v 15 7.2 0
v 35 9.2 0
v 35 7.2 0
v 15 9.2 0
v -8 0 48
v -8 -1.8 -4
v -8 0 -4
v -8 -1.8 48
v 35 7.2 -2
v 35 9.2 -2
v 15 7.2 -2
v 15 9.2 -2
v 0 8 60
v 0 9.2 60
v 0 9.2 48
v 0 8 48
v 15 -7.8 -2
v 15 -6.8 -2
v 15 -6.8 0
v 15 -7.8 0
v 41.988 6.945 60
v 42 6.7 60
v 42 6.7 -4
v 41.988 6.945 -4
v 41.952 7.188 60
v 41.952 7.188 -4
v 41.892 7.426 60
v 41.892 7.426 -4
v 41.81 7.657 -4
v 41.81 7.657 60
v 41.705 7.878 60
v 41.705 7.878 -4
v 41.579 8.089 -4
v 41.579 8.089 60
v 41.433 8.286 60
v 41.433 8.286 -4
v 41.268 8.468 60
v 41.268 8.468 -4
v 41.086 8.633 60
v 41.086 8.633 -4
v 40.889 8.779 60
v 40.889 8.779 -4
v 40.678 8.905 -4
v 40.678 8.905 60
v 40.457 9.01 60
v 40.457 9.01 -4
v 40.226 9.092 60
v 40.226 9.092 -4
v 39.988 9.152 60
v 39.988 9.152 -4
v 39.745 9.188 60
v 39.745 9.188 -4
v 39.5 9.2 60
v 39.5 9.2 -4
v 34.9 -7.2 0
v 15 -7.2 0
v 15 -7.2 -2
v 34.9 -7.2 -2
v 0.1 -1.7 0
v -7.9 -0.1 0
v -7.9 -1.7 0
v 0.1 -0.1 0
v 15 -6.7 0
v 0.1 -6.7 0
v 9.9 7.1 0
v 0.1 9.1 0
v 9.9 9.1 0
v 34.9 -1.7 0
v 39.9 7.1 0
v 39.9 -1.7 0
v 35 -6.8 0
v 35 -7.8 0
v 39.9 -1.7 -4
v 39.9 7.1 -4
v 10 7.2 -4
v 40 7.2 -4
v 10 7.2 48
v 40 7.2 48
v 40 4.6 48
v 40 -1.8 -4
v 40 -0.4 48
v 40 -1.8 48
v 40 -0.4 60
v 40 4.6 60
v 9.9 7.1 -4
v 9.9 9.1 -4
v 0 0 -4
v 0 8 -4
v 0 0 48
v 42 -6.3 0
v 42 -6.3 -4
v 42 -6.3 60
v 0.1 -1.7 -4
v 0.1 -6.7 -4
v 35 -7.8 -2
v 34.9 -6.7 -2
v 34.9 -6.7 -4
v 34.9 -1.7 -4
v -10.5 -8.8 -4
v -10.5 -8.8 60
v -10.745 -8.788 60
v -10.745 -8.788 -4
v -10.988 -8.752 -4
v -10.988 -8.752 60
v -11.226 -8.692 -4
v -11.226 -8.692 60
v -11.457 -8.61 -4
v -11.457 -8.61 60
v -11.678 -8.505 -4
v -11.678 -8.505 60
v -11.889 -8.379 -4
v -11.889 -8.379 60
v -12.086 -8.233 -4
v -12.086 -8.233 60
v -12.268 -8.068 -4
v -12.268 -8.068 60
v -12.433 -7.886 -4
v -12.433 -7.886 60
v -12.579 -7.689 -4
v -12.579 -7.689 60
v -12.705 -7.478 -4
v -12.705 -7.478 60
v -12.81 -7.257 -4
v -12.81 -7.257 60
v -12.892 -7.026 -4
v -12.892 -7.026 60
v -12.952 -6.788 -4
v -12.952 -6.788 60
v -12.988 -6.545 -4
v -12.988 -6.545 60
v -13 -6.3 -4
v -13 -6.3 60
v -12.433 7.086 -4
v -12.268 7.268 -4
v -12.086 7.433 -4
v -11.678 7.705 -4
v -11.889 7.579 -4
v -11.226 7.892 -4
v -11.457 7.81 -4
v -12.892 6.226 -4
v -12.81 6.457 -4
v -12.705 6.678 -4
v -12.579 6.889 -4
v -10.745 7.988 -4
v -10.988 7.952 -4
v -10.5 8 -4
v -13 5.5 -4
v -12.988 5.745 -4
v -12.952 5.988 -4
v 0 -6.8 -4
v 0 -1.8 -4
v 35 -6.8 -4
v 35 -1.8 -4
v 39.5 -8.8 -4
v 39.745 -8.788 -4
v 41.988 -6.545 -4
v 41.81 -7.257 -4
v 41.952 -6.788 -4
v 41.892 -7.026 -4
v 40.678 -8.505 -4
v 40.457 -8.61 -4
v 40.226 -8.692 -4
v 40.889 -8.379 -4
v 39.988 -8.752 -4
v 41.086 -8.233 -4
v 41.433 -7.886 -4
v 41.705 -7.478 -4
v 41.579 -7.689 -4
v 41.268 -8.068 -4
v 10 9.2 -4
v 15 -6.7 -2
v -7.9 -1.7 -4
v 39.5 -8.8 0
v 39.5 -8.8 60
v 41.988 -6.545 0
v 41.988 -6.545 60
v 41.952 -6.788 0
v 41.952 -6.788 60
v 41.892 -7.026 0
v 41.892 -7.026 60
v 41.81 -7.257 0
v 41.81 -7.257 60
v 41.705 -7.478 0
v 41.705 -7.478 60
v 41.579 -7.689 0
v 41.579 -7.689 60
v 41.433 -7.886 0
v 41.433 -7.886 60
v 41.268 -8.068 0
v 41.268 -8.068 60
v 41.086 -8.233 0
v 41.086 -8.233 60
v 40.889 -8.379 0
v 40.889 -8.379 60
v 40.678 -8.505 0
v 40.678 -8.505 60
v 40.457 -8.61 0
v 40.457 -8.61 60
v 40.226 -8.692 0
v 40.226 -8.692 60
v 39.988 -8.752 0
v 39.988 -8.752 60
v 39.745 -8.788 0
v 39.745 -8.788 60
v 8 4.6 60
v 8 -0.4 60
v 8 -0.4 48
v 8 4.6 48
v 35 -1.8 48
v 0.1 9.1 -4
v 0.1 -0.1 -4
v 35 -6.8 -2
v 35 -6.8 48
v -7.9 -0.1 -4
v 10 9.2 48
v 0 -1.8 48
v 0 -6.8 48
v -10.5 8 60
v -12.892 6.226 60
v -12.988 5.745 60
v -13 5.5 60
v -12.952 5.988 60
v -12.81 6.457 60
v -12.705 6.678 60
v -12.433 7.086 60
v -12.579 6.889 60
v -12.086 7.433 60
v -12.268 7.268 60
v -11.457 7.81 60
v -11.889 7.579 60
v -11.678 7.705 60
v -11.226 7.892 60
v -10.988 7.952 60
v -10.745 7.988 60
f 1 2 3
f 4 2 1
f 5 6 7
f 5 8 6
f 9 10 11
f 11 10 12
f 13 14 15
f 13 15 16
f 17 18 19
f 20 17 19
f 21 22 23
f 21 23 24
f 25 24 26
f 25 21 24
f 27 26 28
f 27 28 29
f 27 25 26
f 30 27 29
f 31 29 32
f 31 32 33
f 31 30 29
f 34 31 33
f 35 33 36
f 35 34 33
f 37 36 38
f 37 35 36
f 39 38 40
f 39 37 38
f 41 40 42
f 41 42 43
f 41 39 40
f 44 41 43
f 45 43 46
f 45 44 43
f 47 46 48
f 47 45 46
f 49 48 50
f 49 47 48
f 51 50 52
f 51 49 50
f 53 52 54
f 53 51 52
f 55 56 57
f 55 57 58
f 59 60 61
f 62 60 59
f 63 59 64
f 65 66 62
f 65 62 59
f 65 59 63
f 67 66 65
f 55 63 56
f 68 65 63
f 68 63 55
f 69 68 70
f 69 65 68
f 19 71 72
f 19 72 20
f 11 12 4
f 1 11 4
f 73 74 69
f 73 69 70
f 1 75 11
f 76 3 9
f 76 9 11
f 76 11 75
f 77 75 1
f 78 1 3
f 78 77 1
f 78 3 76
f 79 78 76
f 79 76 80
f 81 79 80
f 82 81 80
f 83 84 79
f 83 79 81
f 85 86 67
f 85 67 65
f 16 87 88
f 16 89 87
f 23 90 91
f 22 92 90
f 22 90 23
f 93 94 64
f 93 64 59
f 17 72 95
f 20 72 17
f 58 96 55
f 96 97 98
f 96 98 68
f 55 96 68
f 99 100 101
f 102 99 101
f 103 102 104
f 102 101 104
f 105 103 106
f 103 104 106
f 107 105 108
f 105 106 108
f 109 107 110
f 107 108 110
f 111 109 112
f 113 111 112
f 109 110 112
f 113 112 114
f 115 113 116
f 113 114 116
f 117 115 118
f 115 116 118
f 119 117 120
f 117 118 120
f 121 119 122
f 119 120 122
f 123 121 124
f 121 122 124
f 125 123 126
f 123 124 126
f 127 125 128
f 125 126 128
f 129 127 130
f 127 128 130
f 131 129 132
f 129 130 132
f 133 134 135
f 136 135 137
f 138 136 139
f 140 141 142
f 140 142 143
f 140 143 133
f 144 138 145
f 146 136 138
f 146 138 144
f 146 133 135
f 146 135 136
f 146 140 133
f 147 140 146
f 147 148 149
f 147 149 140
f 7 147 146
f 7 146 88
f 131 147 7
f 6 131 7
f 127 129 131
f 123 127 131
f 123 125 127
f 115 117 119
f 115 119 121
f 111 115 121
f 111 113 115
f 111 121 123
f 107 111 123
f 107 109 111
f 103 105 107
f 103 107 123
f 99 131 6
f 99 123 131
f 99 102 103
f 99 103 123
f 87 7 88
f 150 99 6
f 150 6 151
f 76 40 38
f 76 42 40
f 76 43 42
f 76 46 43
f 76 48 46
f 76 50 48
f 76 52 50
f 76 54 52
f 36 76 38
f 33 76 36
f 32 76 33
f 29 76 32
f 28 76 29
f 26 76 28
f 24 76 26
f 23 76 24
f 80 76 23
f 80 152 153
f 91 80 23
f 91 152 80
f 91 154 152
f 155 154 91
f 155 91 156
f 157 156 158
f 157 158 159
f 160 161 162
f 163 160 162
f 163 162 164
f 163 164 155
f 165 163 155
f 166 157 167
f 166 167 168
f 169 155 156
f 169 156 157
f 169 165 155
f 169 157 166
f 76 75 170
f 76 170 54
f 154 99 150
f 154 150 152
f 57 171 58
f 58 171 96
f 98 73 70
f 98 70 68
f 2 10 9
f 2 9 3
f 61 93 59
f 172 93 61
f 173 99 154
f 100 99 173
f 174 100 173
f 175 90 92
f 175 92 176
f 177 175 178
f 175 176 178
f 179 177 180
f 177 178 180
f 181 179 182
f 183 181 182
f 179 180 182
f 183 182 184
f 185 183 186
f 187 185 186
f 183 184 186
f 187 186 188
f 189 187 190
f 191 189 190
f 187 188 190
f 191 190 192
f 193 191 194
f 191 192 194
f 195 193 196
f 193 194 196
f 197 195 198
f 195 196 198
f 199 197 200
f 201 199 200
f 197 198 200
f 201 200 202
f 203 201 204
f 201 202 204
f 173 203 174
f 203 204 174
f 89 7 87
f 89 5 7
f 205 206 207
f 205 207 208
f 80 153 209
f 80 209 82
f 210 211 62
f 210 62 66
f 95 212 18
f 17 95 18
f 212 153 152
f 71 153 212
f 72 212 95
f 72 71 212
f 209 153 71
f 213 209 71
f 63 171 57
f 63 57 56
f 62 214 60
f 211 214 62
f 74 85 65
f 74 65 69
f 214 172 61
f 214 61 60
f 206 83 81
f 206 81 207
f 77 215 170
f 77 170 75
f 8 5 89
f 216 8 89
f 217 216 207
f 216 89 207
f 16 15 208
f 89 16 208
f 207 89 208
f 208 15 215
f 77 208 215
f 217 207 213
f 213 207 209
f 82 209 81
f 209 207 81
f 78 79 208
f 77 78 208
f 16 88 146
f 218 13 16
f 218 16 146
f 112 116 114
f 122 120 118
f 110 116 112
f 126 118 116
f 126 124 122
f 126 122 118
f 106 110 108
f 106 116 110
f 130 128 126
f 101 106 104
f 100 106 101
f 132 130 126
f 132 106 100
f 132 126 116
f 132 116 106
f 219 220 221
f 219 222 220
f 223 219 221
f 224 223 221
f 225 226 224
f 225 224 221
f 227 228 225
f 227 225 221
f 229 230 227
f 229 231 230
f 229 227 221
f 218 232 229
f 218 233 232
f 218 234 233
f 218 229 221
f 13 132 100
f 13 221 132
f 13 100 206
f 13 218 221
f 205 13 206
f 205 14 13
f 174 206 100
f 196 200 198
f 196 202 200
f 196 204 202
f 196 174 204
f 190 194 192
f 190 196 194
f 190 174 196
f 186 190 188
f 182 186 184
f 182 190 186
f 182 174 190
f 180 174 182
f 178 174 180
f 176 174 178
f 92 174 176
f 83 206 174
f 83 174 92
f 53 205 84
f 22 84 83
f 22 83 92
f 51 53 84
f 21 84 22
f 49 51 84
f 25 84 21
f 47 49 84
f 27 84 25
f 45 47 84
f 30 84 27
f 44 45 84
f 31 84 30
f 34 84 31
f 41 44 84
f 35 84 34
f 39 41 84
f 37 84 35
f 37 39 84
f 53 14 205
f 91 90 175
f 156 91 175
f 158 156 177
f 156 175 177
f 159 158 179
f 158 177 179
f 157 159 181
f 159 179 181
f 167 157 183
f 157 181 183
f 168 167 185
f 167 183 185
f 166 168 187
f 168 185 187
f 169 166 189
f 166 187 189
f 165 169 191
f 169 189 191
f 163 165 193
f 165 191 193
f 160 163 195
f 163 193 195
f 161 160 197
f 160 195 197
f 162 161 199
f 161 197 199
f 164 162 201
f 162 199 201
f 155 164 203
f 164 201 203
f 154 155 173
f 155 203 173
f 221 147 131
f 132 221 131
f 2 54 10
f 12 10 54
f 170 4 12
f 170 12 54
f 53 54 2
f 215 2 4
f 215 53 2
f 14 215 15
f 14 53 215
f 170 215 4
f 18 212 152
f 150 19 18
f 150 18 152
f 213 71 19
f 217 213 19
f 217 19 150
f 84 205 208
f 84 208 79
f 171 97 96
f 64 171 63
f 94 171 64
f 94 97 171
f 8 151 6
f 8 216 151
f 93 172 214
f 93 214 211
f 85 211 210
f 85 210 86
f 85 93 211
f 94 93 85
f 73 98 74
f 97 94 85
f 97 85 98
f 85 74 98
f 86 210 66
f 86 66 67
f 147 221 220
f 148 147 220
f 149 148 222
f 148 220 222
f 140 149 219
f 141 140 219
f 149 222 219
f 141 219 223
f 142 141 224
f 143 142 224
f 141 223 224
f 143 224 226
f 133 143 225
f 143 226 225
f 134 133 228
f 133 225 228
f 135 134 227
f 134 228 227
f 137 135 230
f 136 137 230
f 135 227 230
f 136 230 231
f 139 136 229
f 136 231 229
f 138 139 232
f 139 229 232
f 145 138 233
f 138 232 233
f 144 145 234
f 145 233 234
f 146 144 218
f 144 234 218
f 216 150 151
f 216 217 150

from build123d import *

# Parameters (mm, degrees)
F1_DEPTH  = 60
F3_DEPTH  = 12
F4_R      = 2.5
F5_DEPTH  = 4
F6_W      = 5
F6_H      = 5
F7_DEPTH  = 52
F8_W      = 20
F8_H      = 2
F9_DEPTH  = 17
F12_DEPTH = 4
F14_W     = 19.9
F14_H     = 2
F15_DEPTH = 0.5


# Not quite as in the source:
# - a feature names something its author has since deleted; it is built from what else it names


with BuildPart() as f1:
    # F0 (on Top) → F1 (new body)
    with BuildSketch(Plane.XY):
        Polygon((-8, 0), (0, 0), (0, 8), (-8, 8), (-13, 8), (-13, -6.8), (-13, -8.8), (42, -8.8), (42, 9.2), (10, 9.2), (10, 7.2), (40, 7.2), (40, -6.8), (0, -6.8), (0, -1.8), (-8, -1.8), align=None)
    extrude(amount=F1_DEPTH)

    # F2 (on face) → F3 (join)
    with BuildSketch(Plane.XY.offset(60)):
        Polygon((40, -0.4), (8, -0.4), (8, 4.6), (40, 4.6), (40, 7.2), (10, 7.2), (10, 9.2), (0, 9.2), (0, 8), (0, 0), (-8, 0), (-8, -1.8), (0, -1.8), (0, -6.8), (40, -6.8), align=None)
    extrude(amount=-F3_DEPTH)

    # F4
    f4_edges = [f1.edges().sort_by_distance(p)[0] for p in [
        (42, 9.2, 30),
        (42, -8.8, 30),
        (-13, -8.8, 30),
        (-13, 8, 30),
    ]]
    fillet(f4_edges, radius=F4_R)

    # F5 (add): a face of the model
    f5_faces = [f1.faces().sort_by_distance(p)[0] for p in [
        (-5.25, 7.4212945482, 0),
    ]]
    extrude(f5_faces, amount=F5_DEPTH)

    # F6 (on face) → F7 (join)
    with BuildSketch(Plane(origin=(0, 0, 48), x_dir=(1, 0, 0), z_dir=(0, 0, -1))):
        with Locations((37.5, 4.3)):
            Rectangle(F6_W, F6_H)
    extrude(amount=F7_DEPTH)

    # F8 (on face) → F9 (cut)
    with BuildSketch(Plane(origin=(0, 9.2, 0), x_dir=(-1, 0, 0), z_dir=(0, 1, 0))):
        with Locations((-25, -1)):
            Rectangle(F8_W, F8_H)
    extrude(amount=-F9_DEPTH, mode=Mode.SUBTRACT)


with BuildPart() as f12:
    # F11 (on face) → F12 (new body)
    with BuildSketch(Plane(origin=(0, 0, -4), x_dir=(1, 0, 0), z_dir=(0, 0, -1))):
        Polygon((9.9, -9.1), (9.9, -7.1), (39.9, -7.1), (39.9, 1.7), (34.9, 1.7), (34.9, 6.7), (0.1, 6.7), (0.1, 1.7), (-7.9, 1.7), (-7.9, 0.1), (0.1, 0.1), (0.1, -0.2000001237), (0.1, -9.1), align=None)
    extrude(amount=-F12_DEPTH)

    # F14 (on face) → F15 (join)
    with BuildSketch(Plane.XZ.offset(6.7)):
        with Locations((24.95, -1)):
            Rectangle(F14_W, F14_H)
    extrude(amount=F15_DEPTH)


solid = Compound([f1.part, f12.part])
